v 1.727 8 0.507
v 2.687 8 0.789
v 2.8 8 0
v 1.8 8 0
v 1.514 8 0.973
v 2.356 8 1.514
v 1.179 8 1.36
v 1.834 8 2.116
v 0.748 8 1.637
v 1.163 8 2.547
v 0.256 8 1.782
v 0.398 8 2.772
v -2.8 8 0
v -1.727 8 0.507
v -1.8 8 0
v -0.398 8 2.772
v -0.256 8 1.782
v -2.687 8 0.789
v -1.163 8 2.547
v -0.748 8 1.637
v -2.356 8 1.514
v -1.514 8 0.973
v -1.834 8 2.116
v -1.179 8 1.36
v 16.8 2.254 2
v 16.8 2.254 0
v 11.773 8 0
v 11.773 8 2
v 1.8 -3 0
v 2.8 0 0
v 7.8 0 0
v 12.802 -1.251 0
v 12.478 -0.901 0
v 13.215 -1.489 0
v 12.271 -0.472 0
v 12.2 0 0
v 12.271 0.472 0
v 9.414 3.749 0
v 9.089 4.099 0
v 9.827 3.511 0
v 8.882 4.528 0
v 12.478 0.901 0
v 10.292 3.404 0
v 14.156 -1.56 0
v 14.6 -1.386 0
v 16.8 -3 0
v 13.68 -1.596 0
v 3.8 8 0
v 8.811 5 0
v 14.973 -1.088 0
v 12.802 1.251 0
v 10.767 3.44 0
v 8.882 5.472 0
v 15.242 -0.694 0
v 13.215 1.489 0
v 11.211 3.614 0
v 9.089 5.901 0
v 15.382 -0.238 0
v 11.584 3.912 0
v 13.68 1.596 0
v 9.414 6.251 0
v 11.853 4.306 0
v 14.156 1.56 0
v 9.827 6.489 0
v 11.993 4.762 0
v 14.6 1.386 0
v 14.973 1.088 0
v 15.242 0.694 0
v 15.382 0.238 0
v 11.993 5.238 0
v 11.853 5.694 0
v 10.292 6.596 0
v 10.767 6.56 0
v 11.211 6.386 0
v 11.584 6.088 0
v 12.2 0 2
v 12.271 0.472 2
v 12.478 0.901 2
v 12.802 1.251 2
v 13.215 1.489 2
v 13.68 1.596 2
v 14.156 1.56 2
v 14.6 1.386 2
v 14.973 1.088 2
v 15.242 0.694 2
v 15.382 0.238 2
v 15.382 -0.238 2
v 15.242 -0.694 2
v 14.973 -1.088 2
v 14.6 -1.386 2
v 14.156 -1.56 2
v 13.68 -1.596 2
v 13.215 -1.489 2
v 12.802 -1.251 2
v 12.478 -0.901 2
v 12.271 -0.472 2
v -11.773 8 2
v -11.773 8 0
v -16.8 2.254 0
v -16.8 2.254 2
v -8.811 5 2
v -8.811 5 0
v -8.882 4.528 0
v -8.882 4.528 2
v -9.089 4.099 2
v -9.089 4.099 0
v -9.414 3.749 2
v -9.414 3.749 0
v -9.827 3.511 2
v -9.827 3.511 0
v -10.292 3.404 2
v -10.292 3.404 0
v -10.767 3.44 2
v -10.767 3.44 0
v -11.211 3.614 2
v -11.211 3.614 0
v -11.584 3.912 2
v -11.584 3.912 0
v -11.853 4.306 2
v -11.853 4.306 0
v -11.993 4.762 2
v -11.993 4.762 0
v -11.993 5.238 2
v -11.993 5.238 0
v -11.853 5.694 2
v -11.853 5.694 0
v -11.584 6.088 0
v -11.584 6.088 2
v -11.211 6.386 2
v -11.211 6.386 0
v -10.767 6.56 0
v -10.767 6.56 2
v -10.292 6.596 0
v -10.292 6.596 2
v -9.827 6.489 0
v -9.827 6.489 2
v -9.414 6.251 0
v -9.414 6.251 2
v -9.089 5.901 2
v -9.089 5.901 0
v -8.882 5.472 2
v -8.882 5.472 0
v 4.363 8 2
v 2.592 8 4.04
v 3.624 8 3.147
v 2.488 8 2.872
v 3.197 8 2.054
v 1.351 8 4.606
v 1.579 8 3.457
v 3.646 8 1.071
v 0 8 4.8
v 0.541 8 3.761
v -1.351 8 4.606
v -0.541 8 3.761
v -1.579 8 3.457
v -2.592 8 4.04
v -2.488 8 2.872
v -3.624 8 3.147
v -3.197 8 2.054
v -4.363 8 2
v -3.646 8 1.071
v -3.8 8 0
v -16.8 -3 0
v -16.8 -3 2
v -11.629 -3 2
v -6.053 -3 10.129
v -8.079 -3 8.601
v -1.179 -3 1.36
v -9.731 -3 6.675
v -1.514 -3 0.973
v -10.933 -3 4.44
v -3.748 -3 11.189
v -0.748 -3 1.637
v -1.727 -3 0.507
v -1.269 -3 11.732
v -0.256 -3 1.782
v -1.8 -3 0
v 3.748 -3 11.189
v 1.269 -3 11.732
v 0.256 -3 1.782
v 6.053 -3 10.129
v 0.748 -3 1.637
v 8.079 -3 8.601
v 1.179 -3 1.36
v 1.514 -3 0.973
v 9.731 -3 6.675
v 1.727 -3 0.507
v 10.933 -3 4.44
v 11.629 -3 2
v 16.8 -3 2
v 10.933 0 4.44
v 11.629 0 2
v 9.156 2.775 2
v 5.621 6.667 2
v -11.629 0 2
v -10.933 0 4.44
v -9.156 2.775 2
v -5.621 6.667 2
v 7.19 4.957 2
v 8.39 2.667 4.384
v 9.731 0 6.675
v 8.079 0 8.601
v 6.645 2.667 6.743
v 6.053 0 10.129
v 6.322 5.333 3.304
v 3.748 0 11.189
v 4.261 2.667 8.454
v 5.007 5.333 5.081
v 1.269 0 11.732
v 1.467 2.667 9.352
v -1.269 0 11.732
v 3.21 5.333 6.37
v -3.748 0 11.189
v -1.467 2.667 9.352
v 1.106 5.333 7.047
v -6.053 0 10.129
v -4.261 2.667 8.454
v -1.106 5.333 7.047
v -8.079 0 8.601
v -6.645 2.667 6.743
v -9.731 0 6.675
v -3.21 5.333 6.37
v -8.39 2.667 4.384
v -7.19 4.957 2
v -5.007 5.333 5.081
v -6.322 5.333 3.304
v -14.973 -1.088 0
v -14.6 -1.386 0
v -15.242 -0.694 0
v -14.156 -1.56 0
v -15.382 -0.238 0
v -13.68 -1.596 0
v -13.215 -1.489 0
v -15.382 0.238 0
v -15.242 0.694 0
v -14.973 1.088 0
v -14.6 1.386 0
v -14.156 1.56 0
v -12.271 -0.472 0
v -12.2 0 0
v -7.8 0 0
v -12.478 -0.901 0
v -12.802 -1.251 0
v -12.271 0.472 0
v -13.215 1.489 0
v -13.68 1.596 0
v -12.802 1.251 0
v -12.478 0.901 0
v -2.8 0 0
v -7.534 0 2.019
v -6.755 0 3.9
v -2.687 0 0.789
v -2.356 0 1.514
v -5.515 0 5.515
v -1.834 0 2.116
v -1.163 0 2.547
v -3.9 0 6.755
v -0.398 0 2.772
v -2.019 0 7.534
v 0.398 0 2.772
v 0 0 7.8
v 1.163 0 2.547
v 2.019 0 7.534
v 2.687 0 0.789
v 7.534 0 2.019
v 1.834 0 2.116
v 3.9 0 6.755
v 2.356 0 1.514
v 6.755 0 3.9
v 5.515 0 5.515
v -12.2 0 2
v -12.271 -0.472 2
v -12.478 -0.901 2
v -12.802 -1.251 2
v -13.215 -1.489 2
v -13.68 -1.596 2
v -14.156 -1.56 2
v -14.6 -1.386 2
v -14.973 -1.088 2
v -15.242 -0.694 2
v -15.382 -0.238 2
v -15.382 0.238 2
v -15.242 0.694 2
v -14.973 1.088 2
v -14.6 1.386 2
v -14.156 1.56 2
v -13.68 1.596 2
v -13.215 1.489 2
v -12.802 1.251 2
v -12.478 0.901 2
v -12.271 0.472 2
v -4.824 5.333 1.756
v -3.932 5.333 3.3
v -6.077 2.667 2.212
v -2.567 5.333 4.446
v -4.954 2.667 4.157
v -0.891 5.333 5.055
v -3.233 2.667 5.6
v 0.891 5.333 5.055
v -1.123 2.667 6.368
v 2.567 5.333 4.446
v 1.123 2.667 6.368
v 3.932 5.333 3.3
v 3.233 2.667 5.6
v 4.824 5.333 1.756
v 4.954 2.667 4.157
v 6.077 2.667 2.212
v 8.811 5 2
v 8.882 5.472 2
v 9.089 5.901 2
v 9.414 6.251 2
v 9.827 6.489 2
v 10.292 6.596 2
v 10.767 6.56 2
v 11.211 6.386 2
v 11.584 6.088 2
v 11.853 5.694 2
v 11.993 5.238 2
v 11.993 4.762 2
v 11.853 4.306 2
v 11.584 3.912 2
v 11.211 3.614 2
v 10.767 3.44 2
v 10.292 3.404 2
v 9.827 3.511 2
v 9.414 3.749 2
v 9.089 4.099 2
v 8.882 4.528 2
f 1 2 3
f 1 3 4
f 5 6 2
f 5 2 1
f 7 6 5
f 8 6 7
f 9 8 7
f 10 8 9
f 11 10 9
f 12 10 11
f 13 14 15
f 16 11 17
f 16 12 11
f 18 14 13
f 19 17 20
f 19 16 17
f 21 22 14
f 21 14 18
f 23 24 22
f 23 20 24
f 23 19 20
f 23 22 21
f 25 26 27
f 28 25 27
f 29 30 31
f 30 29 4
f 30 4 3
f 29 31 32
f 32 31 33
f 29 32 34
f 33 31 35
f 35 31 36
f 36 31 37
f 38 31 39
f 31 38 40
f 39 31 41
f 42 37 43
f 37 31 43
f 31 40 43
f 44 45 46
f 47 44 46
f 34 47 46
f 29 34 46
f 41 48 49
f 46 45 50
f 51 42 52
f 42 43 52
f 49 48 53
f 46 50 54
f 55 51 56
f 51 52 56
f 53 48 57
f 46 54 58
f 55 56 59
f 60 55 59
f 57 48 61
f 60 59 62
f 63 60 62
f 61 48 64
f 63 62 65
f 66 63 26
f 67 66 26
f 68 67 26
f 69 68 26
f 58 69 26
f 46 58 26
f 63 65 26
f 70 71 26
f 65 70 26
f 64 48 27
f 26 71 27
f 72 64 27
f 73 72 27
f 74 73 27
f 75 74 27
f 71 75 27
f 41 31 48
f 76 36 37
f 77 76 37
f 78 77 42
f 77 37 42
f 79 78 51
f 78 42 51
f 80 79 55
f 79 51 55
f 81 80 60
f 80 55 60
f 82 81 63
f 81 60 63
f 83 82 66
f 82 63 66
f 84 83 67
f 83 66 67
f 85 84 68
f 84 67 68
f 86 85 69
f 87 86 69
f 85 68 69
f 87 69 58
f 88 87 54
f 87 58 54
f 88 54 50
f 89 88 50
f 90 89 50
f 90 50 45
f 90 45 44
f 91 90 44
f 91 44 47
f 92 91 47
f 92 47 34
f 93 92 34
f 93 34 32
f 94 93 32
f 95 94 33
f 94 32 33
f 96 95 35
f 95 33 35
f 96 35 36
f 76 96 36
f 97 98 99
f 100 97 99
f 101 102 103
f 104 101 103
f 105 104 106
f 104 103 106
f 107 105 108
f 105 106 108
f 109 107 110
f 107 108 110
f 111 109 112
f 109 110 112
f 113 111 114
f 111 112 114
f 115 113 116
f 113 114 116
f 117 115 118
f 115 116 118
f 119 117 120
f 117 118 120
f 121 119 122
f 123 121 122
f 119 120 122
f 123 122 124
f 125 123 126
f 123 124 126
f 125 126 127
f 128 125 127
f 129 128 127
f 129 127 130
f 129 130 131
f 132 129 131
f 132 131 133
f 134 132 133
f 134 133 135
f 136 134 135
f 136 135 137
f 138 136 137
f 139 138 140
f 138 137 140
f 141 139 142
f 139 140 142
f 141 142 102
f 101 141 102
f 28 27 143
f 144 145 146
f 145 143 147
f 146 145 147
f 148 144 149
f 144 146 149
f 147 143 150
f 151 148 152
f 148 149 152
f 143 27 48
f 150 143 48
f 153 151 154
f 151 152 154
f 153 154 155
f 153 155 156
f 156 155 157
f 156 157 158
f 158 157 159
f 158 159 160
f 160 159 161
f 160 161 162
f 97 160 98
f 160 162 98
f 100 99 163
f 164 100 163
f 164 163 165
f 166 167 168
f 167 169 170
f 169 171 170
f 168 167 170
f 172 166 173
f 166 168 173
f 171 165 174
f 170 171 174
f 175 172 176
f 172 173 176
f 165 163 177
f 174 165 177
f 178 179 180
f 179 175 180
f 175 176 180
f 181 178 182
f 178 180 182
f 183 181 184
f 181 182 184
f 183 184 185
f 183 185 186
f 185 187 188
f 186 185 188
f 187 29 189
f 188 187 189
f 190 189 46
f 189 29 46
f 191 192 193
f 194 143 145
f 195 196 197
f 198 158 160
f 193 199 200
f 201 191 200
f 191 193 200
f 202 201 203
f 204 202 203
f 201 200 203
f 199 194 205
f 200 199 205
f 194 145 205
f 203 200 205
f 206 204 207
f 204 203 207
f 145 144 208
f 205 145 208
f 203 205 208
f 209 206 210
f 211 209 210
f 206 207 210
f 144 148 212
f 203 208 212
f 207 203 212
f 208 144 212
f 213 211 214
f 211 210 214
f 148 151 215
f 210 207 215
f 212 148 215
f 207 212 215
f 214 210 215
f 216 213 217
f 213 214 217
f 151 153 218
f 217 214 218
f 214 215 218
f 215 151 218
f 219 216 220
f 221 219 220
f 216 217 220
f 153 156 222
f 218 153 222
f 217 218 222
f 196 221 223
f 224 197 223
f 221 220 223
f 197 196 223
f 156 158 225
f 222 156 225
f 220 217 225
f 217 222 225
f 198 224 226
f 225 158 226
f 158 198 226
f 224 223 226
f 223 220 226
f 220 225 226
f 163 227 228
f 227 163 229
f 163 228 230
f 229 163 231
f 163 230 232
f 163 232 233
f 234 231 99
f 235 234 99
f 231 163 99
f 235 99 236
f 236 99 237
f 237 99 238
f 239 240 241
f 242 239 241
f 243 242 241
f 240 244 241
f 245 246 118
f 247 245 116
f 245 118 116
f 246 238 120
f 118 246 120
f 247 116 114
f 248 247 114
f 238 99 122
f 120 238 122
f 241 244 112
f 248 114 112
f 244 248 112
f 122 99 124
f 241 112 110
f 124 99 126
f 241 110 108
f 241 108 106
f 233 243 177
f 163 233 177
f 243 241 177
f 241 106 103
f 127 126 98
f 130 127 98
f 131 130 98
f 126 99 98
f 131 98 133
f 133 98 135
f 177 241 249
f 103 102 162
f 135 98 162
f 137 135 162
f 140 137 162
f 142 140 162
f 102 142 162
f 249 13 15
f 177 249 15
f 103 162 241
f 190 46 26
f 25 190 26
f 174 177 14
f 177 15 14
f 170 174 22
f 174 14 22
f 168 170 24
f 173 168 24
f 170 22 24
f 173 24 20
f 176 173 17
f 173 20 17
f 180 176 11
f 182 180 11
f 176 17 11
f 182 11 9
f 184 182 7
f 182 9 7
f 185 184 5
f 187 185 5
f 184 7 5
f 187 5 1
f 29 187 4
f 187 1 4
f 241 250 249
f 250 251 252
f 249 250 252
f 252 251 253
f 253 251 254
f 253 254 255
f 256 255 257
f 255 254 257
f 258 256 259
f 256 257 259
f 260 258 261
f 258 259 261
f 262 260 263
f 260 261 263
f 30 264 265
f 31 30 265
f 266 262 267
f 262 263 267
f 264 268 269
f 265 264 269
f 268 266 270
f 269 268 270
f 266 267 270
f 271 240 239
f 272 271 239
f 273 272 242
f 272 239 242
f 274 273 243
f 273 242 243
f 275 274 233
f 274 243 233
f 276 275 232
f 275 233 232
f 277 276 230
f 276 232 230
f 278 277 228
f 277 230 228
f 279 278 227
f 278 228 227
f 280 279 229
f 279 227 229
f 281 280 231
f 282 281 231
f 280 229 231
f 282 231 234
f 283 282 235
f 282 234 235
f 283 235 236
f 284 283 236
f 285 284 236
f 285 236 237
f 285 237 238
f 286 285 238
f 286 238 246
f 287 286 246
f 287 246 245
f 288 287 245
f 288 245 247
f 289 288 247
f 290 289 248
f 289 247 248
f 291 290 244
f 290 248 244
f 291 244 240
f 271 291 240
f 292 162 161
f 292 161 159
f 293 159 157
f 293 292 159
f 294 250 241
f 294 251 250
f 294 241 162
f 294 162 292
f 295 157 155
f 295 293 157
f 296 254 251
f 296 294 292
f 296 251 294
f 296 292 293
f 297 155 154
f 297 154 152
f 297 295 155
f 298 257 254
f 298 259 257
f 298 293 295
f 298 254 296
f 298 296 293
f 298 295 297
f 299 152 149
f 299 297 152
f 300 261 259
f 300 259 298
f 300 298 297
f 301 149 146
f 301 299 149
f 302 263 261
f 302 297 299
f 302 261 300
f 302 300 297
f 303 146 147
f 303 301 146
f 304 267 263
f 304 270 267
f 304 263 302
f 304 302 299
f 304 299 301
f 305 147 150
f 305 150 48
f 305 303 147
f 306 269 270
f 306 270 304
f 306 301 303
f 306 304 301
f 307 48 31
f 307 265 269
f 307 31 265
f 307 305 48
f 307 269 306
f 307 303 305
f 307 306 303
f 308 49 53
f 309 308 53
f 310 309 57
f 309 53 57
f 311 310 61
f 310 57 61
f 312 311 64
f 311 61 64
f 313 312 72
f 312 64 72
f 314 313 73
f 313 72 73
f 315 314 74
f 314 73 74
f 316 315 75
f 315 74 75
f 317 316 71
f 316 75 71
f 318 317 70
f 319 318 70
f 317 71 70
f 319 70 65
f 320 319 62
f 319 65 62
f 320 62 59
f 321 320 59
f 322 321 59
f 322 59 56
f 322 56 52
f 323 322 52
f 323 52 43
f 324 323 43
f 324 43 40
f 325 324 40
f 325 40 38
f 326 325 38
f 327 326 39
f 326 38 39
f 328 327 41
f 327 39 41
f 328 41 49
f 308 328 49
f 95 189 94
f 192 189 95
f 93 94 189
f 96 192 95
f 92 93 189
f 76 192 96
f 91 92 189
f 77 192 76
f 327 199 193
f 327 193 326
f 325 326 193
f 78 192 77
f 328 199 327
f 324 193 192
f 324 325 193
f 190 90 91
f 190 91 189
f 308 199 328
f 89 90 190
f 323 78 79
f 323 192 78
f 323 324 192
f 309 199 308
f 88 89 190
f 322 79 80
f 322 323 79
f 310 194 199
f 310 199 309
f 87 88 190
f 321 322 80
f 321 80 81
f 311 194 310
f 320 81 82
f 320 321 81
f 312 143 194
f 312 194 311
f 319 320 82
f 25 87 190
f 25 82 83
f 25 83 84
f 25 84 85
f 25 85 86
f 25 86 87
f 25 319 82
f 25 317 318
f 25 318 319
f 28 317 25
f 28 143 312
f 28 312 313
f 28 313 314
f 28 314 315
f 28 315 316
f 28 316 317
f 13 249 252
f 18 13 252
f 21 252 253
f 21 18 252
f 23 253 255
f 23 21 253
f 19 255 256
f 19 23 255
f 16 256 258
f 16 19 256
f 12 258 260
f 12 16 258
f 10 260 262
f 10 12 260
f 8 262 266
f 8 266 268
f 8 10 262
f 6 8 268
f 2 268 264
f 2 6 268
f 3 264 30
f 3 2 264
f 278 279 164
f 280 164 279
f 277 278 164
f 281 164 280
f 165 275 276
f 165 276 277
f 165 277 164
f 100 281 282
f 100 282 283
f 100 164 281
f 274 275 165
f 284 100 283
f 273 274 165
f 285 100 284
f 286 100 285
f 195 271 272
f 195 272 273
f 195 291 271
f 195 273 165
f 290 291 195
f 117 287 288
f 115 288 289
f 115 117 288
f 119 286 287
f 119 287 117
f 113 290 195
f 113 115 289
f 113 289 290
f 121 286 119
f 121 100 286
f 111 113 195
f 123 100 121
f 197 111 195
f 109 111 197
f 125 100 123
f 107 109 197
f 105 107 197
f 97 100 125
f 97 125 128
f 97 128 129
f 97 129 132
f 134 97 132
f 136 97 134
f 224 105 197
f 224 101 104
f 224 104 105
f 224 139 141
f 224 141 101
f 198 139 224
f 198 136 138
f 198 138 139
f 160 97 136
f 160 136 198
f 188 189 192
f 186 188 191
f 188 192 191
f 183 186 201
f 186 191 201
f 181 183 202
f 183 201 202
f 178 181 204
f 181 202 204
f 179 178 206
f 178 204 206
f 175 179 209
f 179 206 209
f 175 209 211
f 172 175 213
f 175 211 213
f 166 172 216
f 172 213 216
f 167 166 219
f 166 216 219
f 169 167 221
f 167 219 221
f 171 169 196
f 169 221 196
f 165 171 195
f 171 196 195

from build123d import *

# Parameters (mm, degrees)
SKETCH1_W             = 1
SKETCH1_H             = 8
REVOLVE1_ANGLE        = 180
SKETCH2_R             = 1.6
BOSS_EXTRUDE1_DEPTH   = 2
BOSS_EXTRUDE1_2_DEPTH = 2
REVOLVE2_ANGLE        = 180


with BuildPart() as part:
    # Sketch1 → Revolve1 (revolve)
    with BuildSketch(Plane.XY):
        Polygon((-1.8, -3), (-1.8, 0), (-2.8, 0), (-7.8, 0), (-10.8, 0), (-10.8, -3), align=None)
        Polygon((-10.8, 0), (-3.8, 8), (-7.8, 0), align=None)
        with Locations((-2.3, 4)):
            Rectangle(SKETCH1_W, SKETCH1_H)
    revolve(axis=Axis((0, 0, 0), (0, 1, 0)), revolution_arc=REVOLVE1_ANGLE)



with BuildPart() as body_2:
    # Sketch2 → Boss-Extrude1 (new body)
    with BuildSketch(Plane(origin=(0, 0, 0), x_dir=(-1, 0, 0), z_dir=(0, 0, -1))):
        Polygon((-10.8, -3), (-16.8, -3), (-16.8, 2.254410697), (-11.77260936, 8), (-3.8, 8), (-10.8, 0), align=None)
        with Locations((-10.41130468, 5)):
            Circle(SKETCH2_R, mode=Mode.SUBTRACT)
        with Locations((-13.8, 0)):
            Circle(SKETCH2_R, mode=Mode.SUBTRACT)
    extrude(amount=-BOSS_EXTRUDE1_DEPTH)


with BuildPart() as body_3:
    # Sketch2 → Boss-Extrude1 2 (new body)
    with BuildSketch(Plane(origin=(0, 0, 0), x_dir=(-1, 0, 0), z_dir=(0, 0, -1))):
        Polygon((10.8, 0), (3.8, 8), (11.77260936, 8), (16.8, 2.254410697), (16.8, -3), (10.8, -3), align=None)
        with Locations(Location((13.8, 0, 0), (0, 0, 180))):
            Circle(SKETCH2_R, mode=Mode.SUBTRACT)
        with Locations(Location((10.41130468, 5, 0), (0, 0, 180))):
            Circle(SKETCH2_R, mode=Mode.SUBTRACT)
    extrude(amount=-BOSS_EXTRUDE1_2_DEPTH)


with BuildPart() as part_1:
    add(part.part)

    add(body_2.part)  # Revolve2 merges body 2

    add(body_3.part)  # Revolve2 merges body 3
    # Sketch3 → Revolve2 (revolve)
    with BuildSketch(Plane(origin=(0, 0, 0), x_dir=(-1, 0, 0), z_dir=(0, 0, -1))):
        Polygon((-11.8, -3), (-11.8, 0), (-4.8, 8), (-3.8, 8), (-10.8, 0), (-10.8, -3), align=None)
    revolve(axis=Axis((0, 0, 0), (0, -1, 0)), revolution_arc=REVOLVE2_ANGLE)


solid = part_1.part
